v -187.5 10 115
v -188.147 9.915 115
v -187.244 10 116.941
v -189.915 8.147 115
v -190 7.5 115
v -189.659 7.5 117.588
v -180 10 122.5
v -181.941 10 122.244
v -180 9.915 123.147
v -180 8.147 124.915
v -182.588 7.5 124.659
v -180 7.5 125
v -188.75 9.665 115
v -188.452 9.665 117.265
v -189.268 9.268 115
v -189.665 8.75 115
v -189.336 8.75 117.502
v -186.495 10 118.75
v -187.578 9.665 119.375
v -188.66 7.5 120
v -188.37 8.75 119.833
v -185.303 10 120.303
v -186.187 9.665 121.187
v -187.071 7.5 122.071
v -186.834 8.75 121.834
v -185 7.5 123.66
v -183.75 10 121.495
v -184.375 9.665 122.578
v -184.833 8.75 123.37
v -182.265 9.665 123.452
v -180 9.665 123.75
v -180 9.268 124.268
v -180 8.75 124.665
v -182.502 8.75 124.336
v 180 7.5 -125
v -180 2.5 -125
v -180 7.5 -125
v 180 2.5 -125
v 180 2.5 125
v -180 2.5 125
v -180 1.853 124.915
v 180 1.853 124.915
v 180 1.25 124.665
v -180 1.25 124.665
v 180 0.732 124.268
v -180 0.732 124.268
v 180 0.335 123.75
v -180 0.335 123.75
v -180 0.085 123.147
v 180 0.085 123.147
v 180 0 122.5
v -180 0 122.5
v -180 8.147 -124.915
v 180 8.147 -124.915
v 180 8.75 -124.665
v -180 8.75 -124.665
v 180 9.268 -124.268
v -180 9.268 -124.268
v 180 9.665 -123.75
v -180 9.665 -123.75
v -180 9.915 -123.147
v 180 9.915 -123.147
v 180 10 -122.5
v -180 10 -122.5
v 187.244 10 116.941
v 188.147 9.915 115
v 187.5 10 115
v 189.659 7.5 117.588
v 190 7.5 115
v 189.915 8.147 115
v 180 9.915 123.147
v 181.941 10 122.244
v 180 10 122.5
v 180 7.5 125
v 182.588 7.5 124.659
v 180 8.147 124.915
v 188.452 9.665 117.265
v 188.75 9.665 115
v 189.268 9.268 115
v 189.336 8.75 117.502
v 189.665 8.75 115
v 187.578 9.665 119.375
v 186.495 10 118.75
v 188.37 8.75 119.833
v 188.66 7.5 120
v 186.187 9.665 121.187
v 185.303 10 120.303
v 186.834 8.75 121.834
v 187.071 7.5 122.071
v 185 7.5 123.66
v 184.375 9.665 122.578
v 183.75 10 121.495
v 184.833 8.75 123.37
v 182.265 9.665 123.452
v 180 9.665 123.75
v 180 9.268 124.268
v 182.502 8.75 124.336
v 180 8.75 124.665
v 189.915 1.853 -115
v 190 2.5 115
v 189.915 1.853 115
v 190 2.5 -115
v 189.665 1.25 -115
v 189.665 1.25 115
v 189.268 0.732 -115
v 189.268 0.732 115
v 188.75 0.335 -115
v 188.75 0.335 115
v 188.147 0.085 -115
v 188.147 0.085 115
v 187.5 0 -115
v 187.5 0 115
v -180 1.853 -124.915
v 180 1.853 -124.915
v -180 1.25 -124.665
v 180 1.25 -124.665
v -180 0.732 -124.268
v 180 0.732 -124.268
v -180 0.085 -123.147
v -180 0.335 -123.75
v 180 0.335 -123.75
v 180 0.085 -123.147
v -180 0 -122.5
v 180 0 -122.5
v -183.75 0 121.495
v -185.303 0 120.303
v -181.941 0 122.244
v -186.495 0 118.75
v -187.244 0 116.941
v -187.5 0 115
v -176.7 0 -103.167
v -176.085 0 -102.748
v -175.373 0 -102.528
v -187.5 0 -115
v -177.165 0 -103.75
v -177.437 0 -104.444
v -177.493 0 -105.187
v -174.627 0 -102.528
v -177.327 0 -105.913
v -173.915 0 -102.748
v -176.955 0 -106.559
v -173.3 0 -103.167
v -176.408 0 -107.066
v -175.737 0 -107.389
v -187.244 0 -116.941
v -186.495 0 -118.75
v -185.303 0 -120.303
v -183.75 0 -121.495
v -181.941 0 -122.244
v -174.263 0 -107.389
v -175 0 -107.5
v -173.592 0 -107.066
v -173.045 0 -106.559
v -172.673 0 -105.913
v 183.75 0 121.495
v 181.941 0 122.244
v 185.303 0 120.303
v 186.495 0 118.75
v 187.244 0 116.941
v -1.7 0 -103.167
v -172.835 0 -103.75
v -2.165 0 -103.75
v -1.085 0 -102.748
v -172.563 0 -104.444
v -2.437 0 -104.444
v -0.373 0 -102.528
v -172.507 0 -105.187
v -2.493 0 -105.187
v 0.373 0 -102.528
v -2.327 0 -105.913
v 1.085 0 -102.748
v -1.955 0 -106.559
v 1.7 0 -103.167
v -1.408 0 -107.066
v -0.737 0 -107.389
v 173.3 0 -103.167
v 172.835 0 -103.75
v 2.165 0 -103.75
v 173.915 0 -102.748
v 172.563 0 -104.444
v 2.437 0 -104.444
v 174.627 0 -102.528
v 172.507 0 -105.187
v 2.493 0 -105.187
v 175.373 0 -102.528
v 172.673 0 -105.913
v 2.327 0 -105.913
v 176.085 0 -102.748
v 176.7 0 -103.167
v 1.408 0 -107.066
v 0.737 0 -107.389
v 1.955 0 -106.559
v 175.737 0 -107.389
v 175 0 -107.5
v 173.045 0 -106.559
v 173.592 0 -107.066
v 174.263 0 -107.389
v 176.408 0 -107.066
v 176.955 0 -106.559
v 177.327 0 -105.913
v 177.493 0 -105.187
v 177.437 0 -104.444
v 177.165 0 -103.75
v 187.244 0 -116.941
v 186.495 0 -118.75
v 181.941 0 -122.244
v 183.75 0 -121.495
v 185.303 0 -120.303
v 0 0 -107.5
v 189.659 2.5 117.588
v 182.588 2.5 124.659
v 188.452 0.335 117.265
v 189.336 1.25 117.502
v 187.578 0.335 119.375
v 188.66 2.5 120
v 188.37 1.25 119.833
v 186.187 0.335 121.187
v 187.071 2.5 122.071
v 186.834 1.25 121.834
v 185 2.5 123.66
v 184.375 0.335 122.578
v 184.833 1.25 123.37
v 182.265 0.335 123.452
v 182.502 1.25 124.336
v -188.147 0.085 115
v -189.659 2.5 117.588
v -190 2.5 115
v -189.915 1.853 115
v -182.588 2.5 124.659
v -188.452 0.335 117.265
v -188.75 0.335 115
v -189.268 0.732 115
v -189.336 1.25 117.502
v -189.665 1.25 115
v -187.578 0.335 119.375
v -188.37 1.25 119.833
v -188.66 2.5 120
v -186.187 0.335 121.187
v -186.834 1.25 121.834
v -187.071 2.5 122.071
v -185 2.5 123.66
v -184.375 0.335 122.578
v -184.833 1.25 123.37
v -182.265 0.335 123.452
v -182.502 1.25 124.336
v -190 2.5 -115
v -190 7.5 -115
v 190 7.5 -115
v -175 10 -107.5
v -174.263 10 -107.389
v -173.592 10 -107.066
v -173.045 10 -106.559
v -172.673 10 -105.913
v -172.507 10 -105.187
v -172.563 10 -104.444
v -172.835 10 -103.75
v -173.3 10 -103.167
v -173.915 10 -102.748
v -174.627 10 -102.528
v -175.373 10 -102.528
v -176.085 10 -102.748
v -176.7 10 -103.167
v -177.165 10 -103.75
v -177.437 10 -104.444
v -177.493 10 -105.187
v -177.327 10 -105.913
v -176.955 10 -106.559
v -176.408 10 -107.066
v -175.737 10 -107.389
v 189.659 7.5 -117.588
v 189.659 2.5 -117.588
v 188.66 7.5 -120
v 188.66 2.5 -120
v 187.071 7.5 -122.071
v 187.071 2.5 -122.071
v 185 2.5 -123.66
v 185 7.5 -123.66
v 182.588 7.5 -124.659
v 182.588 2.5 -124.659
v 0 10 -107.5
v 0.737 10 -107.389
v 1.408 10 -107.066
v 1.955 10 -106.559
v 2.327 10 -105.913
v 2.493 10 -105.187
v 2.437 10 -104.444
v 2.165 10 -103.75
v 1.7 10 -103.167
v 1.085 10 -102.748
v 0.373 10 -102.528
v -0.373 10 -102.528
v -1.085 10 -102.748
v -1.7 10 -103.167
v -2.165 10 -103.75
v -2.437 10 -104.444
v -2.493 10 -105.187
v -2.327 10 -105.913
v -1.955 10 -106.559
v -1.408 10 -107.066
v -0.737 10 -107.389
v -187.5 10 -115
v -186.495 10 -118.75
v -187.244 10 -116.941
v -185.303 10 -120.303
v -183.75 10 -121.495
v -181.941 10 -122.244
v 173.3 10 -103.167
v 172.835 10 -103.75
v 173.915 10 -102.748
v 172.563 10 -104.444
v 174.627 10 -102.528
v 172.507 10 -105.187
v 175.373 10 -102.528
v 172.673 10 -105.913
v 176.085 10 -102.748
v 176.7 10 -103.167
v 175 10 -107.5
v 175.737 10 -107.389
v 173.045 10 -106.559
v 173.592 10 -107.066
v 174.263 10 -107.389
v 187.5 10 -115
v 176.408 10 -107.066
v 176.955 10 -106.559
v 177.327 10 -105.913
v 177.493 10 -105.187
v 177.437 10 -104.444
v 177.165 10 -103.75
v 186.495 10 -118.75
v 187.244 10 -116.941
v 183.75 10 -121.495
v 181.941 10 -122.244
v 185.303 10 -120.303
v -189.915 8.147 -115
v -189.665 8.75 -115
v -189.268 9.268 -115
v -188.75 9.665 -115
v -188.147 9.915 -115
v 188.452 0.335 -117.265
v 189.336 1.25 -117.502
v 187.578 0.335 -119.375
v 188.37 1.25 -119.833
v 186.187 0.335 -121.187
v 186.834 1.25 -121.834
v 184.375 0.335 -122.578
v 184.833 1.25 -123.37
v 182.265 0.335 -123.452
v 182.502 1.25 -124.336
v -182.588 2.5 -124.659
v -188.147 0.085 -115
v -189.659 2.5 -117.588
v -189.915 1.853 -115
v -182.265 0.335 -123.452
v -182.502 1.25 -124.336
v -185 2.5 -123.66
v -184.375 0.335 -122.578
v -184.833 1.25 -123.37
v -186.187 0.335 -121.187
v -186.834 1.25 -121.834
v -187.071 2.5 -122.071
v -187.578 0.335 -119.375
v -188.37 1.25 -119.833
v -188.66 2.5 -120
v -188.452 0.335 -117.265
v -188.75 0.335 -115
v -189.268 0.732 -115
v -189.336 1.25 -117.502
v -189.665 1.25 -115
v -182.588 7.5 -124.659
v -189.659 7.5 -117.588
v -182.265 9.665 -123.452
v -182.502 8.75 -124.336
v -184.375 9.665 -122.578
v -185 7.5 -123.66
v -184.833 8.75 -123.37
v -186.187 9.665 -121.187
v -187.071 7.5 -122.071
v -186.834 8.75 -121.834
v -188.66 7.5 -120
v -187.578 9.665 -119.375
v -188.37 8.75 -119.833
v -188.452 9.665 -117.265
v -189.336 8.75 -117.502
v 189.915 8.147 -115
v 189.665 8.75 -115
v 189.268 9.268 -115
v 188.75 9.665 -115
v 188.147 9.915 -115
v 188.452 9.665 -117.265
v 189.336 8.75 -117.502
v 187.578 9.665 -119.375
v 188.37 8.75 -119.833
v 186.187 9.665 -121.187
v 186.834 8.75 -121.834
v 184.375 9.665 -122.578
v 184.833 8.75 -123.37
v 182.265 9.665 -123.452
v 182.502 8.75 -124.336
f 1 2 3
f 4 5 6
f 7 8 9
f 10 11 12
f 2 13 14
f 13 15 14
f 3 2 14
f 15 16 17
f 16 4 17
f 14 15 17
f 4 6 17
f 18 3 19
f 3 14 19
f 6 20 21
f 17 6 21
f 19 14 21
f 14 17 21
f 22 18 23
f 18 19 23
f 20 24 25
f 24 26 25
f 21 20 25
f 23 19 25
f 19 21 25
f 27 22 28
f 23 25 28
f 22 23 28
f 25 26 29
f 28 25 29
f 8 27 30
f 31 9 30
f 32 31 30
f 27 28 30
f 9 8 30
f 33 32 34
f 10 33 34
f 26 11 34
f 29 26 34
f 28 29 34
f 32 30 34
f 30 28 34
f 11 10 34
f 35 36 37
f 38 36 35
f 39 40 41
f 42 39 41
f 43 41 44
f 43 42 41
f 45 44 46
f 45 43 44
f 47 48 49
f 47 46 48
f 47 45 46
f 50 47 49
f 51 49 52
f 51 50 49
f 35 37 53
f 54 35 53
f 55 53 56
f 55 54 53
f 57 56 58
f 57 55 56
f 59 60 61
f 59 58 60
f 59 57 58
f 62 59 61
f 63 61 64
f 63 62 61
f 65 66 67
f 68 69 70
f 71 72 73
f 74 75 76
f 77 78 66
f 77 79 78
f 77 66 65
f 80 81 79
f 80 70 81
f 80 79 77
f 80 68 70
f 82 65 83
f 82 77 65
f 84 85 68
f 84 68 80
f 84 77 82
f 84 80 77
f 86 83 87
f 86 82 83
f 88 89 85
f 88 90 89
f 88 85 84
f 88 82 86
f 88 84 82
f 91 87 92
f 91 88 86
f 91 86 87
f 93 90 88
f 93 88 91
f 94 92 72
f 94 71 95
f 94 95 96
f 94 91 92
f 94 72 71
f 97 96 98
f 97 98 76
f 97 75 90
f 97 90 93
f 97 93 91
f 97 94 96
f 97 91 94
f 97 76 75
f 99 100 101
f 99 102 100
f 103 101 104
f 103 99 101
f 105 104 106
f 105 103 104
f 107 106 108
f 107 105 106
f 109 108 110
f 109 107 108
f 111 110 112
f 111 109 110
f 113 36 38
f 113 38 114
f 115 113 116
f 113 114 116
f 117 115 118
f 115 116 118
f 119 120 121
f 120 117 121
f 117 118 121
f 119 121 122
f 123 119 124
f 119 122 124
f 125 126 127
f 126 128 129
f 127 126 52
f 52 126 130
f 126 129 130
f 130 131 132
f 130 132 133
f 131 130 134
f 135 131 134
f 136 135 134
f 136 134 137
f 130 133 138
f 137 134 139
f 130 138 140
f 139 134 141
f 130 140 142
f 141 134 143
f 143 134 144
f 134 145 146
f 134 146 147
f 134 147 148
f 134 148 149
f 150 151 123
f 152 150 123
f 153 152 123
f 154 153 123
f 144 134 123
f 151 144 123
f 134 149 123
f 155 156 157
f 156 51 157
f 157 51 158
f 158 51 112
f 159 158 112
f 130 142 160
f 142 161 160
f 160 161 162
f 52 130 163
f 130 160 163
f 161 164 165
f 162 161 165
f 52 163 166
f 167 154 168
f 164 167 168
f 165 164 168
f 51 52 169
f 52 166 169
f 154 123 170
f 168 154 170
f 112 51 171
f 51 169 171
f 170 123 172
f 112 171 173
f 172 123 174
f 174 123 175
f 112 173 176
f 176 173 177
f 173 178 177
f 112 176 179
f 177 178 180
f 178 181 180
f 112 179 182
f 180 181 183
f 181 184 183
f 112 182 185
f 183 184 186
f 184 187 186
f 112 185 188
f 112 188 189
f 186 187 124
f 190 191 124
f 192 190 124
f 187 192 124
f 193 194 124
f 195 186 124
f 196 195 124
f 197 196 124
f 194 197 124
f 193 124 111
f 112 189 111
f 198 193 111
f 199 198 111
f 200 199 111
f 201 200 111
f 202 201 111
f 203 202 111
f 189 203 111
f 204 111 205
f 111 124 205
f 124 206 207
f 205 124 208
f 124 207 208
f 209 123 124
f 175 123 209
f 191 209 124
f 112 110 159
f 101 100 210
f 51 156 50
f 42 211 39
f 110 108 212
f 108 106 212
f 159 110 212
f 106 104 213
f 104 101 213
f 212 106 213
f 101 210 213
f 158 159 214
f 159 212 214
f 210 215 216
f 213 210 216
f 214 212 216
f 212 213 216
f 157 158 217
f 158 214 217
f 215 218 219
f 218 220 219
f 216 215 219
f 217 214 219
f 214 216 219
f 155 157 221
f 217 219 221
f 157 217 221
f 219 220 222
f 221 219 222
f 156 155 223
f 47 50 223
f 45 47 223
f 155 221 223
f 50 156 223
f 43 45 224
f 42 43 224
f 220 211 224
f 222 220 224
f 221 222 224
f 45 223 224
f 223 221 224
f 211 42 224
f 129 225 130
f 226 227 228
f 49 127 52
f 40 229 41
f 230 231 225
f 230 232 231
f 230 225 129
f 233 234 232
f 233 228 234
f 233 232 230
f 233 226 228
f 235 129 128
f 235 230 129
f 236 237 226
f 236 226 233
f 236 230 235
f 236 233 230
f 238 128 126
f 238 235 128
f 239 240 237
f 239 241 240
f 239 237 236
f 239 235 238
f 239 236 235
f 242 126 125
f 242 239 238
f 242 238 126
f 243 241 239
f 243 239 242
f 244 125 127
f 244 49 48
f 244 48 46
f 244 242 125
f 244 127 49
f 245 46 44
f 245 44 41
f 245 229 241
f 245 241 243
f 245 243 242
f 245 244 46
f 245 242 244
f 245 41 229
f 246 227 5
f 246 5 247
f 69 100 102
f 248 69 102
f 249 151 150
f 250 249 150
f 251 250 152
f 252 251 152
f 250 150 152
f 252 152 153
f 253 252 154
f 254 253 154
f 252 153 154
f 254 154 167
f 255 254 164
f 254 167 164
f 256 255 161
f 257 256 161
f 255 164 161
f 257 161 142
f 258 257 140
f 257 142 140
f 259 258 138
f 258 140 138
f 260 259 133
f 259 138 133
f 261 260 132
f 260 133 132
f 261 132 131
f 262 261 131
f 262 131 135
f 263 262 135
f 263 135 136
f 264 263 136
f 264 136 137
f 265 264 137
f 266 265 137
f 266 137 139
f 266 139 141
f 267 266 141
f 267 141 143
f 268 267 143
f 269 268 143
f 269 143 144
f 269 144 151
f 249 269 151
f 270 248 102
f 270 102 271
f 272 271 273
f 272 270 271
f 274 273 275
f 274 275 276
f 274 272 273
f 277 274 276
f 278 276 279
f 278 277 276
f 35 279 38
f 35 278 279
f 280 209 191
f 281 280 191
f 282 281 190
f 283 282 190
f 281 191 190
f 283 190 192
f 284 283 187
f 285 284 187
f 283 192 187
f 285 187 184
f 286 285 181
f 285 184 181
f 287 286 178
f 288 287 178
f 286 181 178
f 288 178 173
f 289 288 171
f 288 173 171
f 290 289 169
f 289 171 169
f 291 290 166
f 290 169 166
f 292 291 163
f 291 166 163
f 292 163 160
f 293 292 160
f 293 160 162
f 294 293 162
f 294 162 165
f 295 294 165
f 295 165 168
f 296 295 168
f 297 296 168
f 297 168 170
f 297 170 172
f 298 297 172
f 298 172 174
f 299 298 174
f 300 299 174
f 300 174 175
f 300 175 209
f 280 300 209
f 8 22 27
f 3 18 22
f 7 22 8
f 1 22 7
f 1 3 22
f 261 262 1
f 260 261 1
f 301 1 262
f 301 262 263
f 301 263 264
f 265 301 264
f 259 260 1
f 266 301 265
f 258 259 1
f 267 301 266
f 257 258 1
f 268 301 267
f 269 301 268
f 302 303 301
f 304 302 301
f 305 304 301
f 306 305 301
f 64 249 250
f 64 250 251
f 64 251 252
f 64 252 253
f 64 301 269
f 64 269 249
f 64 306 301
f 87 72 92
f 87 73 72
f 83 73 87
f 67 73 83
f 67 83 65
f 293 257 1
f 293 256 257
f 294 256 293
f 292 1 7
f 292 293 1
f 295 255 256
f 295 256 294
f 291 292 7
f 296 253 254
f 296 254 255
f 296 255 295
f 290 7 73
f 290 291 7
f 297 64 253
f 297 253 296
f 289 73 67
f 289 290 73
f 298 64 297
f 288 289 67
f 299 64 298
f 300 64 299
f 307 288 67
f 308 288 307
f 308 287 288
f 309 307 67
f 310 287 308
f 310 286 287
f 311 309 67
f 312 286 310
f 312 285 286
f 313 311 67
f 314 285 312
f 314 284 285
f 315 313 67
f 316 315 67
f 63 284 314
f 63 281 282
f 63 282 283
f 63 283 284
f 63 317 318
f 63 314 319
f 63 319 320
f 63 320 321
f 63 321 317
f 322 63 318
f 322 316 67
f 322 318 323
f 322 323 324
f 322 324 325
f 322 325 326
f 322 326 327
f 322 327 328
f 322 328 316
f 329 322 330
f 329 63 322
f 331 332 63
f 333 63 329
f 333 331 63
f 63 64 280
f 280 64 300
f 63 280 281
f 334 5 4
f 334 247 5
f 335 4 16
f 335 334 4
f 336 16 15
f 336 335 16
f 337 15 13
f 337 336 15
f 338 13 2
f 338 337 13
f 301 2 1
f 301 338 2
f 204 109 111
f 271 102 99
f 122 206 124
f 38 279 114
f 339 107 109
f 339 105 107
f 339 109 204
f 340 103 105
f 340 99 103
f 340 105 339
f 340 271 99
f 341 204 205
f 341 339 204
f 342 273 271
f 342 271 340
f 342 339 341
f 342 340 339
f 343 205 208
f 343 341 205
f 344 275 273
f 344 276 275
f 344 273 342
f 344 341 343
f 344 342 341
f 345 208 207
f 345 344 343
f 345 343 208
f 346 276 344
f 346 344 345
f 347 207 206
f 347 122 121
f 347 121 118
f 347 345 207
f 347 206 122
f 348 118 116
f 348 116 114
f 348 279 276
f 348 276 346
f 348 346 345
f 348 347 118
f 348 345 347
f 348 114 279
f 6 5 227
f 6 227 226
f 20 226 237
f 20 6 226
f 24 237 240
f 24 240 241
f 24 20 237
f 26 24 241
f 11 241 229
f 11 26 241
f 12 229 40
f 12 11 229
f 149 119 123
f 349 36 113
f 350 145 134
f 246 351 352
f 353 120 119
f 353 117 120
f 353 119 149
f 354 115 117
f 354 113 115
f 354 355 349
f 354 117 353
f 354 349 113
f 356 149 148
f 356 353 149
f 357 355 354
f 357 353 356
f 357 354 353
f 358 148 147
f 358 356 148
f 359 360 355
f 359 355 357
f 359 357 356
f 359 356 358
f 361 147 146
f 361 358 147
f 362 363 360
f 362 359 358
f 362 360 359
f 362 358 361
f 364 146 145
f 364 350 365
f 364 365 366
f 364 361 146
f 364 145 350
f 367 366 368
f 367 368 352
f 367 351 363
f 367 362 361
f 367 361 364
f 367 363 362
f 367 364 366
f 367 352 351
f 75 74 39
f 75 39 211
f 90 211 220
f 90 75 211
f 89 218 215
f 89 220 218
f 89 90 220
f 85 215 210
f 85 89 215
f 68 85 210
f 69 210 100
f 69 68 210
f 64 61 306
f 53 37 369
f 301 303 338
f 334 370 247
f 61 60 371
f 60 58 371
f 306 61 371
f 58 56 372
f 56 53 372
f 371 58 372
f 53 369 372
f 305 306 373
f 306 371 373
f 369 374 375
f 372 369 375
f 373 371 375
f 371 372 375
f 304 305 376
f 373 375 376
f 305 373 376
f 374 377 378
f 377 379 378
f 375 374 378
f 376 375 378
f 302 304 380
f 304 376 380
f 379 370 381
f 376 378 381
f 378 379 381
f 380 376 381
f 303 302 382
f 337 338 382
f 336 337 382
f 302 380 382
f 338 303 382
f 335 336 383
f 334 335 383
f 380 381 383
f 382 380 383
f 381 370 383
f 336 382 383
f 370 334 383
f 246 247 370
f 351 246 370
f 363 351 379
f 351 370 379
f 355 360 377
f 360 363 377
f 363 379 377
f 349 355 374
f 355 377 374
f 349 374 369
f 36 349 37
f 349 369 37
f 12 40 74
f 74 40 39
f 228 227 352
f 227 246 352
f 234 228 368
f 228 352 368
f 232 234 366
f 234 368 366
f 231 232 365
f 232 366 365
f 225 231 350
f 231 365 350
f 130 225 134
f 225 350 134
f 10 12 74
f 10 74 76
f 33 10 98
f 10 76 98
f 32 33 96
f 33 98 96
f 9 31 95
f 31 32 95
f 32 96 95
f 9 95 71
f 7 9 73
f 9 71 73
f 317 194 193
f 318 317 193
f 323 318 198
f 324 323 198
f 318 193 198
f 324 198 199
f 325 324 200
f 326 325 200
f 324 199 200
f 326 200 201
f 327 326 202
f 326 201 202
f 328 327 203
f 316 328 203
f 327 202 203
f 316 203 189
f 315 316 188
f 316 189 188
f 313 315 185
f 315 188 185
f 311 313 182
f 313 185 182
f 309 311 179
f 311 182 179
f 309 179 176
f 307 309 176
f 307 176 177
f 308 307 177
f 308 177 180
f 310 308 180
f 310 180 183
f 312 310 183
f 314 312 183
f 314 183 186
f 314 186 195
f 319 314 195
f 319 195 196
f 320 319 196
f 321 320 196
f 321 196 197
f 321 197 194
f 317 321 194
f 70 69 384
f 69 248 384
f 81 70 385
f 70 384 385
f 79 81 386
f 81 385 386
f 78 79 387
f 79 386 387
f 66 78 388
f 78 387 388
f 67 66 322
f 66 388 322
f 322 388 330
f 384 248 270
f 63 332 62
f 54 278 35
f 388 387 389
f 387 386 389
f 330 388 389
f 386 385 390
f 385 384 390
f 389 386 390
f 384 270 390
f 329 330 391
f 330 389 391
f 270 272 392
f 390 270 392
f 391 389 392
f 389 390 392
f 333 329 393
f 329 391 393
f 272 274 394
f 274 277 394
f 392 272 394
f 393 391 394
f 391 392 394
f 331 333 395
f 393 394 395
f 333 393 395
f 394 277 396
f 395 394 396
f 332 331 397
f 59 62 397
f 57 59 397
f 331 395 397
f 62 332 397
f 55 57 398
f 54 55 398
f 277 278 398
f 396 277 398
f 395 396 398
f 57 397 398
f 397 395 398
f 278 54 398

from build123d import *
from OCP.BRepFilletAPI import BRepFilletAPI_MakeFillet

# Parameters (mm, degrees)
SKETCH1_W           = 380
SKETCH1_H           = 250
BOSS_EXTRUDE1_DEPTH = 10
FILLET1_R1          = 10
FILLET1_R2          = 2.5
SKETCH2_R           = 2.5
CUT_EXTRUDE1_DEPTH  = 228.651048895


with BuildPart() as part:
    # Sketch1 → Boss-Extrude1 (new body)
    with BuildSketch(Plane(origin=(0, 0, 0), x_dir=(1, 0, 0), z_dir=(0, 1, 0))):
        Rectangle(SKETCH1_W, SKETCH1_H)
    extrude(amount=BOSS_EXTRUDE1_DEPTH)

    # Fillet1: one fillet with a radius per group of edges: ONE call of the kernel's fillet builder (fillet() takes one radius for all edges)
    fillet1_edges_1 = [part.edges().sort_by_distance(p)[0] for p in [
        (190, 5, 125),
        (-190, 5, 125),
        (-190, 5, -125),
        (190, 5, -125),
    ]]
    fillet1_edges_2 = [part.edges().sort_by_distance(p)[0] for p in [
        (190, 10, 0),
        (190, 0, 0),
        (0, 10, -125),
        (0, 0, -125),
        (-190, 10, 0),
        (-190, 0, 0),
        (0, 10, 125),
        (0, 0, 125),
    ]]
    fillet1 = BRepFilletAPI_MakeFillet(part.part.solid().wrapped)
    for e in fillet1_edges_1:
        fillet1.Add(FILLET1_R1, e.wrapped)
    for e in fillet1_edges_2:
        fillet1.Add(FILLET1_R2, e.wrapped)
    add(Compound.cast(fillet1.Shape()), mode=Mode.REPLACE)

    # Sketch2 → Cut-Extrude1 (cut, through all)
    with BuildSketch(Plane.XZ):
        with Locations((0, -105)):
            Circle(SKETCH2_R)
        with Locations((-175, -105)):
            Circle(SKETCH2_R)
        with Locations((175, -105)):
            Circle(SKETCH2_R)
    extrude(amount=-CUT_EXTRUDE1_DEPTH, mode=Mode.SUBTRACT)


solid = part.part
